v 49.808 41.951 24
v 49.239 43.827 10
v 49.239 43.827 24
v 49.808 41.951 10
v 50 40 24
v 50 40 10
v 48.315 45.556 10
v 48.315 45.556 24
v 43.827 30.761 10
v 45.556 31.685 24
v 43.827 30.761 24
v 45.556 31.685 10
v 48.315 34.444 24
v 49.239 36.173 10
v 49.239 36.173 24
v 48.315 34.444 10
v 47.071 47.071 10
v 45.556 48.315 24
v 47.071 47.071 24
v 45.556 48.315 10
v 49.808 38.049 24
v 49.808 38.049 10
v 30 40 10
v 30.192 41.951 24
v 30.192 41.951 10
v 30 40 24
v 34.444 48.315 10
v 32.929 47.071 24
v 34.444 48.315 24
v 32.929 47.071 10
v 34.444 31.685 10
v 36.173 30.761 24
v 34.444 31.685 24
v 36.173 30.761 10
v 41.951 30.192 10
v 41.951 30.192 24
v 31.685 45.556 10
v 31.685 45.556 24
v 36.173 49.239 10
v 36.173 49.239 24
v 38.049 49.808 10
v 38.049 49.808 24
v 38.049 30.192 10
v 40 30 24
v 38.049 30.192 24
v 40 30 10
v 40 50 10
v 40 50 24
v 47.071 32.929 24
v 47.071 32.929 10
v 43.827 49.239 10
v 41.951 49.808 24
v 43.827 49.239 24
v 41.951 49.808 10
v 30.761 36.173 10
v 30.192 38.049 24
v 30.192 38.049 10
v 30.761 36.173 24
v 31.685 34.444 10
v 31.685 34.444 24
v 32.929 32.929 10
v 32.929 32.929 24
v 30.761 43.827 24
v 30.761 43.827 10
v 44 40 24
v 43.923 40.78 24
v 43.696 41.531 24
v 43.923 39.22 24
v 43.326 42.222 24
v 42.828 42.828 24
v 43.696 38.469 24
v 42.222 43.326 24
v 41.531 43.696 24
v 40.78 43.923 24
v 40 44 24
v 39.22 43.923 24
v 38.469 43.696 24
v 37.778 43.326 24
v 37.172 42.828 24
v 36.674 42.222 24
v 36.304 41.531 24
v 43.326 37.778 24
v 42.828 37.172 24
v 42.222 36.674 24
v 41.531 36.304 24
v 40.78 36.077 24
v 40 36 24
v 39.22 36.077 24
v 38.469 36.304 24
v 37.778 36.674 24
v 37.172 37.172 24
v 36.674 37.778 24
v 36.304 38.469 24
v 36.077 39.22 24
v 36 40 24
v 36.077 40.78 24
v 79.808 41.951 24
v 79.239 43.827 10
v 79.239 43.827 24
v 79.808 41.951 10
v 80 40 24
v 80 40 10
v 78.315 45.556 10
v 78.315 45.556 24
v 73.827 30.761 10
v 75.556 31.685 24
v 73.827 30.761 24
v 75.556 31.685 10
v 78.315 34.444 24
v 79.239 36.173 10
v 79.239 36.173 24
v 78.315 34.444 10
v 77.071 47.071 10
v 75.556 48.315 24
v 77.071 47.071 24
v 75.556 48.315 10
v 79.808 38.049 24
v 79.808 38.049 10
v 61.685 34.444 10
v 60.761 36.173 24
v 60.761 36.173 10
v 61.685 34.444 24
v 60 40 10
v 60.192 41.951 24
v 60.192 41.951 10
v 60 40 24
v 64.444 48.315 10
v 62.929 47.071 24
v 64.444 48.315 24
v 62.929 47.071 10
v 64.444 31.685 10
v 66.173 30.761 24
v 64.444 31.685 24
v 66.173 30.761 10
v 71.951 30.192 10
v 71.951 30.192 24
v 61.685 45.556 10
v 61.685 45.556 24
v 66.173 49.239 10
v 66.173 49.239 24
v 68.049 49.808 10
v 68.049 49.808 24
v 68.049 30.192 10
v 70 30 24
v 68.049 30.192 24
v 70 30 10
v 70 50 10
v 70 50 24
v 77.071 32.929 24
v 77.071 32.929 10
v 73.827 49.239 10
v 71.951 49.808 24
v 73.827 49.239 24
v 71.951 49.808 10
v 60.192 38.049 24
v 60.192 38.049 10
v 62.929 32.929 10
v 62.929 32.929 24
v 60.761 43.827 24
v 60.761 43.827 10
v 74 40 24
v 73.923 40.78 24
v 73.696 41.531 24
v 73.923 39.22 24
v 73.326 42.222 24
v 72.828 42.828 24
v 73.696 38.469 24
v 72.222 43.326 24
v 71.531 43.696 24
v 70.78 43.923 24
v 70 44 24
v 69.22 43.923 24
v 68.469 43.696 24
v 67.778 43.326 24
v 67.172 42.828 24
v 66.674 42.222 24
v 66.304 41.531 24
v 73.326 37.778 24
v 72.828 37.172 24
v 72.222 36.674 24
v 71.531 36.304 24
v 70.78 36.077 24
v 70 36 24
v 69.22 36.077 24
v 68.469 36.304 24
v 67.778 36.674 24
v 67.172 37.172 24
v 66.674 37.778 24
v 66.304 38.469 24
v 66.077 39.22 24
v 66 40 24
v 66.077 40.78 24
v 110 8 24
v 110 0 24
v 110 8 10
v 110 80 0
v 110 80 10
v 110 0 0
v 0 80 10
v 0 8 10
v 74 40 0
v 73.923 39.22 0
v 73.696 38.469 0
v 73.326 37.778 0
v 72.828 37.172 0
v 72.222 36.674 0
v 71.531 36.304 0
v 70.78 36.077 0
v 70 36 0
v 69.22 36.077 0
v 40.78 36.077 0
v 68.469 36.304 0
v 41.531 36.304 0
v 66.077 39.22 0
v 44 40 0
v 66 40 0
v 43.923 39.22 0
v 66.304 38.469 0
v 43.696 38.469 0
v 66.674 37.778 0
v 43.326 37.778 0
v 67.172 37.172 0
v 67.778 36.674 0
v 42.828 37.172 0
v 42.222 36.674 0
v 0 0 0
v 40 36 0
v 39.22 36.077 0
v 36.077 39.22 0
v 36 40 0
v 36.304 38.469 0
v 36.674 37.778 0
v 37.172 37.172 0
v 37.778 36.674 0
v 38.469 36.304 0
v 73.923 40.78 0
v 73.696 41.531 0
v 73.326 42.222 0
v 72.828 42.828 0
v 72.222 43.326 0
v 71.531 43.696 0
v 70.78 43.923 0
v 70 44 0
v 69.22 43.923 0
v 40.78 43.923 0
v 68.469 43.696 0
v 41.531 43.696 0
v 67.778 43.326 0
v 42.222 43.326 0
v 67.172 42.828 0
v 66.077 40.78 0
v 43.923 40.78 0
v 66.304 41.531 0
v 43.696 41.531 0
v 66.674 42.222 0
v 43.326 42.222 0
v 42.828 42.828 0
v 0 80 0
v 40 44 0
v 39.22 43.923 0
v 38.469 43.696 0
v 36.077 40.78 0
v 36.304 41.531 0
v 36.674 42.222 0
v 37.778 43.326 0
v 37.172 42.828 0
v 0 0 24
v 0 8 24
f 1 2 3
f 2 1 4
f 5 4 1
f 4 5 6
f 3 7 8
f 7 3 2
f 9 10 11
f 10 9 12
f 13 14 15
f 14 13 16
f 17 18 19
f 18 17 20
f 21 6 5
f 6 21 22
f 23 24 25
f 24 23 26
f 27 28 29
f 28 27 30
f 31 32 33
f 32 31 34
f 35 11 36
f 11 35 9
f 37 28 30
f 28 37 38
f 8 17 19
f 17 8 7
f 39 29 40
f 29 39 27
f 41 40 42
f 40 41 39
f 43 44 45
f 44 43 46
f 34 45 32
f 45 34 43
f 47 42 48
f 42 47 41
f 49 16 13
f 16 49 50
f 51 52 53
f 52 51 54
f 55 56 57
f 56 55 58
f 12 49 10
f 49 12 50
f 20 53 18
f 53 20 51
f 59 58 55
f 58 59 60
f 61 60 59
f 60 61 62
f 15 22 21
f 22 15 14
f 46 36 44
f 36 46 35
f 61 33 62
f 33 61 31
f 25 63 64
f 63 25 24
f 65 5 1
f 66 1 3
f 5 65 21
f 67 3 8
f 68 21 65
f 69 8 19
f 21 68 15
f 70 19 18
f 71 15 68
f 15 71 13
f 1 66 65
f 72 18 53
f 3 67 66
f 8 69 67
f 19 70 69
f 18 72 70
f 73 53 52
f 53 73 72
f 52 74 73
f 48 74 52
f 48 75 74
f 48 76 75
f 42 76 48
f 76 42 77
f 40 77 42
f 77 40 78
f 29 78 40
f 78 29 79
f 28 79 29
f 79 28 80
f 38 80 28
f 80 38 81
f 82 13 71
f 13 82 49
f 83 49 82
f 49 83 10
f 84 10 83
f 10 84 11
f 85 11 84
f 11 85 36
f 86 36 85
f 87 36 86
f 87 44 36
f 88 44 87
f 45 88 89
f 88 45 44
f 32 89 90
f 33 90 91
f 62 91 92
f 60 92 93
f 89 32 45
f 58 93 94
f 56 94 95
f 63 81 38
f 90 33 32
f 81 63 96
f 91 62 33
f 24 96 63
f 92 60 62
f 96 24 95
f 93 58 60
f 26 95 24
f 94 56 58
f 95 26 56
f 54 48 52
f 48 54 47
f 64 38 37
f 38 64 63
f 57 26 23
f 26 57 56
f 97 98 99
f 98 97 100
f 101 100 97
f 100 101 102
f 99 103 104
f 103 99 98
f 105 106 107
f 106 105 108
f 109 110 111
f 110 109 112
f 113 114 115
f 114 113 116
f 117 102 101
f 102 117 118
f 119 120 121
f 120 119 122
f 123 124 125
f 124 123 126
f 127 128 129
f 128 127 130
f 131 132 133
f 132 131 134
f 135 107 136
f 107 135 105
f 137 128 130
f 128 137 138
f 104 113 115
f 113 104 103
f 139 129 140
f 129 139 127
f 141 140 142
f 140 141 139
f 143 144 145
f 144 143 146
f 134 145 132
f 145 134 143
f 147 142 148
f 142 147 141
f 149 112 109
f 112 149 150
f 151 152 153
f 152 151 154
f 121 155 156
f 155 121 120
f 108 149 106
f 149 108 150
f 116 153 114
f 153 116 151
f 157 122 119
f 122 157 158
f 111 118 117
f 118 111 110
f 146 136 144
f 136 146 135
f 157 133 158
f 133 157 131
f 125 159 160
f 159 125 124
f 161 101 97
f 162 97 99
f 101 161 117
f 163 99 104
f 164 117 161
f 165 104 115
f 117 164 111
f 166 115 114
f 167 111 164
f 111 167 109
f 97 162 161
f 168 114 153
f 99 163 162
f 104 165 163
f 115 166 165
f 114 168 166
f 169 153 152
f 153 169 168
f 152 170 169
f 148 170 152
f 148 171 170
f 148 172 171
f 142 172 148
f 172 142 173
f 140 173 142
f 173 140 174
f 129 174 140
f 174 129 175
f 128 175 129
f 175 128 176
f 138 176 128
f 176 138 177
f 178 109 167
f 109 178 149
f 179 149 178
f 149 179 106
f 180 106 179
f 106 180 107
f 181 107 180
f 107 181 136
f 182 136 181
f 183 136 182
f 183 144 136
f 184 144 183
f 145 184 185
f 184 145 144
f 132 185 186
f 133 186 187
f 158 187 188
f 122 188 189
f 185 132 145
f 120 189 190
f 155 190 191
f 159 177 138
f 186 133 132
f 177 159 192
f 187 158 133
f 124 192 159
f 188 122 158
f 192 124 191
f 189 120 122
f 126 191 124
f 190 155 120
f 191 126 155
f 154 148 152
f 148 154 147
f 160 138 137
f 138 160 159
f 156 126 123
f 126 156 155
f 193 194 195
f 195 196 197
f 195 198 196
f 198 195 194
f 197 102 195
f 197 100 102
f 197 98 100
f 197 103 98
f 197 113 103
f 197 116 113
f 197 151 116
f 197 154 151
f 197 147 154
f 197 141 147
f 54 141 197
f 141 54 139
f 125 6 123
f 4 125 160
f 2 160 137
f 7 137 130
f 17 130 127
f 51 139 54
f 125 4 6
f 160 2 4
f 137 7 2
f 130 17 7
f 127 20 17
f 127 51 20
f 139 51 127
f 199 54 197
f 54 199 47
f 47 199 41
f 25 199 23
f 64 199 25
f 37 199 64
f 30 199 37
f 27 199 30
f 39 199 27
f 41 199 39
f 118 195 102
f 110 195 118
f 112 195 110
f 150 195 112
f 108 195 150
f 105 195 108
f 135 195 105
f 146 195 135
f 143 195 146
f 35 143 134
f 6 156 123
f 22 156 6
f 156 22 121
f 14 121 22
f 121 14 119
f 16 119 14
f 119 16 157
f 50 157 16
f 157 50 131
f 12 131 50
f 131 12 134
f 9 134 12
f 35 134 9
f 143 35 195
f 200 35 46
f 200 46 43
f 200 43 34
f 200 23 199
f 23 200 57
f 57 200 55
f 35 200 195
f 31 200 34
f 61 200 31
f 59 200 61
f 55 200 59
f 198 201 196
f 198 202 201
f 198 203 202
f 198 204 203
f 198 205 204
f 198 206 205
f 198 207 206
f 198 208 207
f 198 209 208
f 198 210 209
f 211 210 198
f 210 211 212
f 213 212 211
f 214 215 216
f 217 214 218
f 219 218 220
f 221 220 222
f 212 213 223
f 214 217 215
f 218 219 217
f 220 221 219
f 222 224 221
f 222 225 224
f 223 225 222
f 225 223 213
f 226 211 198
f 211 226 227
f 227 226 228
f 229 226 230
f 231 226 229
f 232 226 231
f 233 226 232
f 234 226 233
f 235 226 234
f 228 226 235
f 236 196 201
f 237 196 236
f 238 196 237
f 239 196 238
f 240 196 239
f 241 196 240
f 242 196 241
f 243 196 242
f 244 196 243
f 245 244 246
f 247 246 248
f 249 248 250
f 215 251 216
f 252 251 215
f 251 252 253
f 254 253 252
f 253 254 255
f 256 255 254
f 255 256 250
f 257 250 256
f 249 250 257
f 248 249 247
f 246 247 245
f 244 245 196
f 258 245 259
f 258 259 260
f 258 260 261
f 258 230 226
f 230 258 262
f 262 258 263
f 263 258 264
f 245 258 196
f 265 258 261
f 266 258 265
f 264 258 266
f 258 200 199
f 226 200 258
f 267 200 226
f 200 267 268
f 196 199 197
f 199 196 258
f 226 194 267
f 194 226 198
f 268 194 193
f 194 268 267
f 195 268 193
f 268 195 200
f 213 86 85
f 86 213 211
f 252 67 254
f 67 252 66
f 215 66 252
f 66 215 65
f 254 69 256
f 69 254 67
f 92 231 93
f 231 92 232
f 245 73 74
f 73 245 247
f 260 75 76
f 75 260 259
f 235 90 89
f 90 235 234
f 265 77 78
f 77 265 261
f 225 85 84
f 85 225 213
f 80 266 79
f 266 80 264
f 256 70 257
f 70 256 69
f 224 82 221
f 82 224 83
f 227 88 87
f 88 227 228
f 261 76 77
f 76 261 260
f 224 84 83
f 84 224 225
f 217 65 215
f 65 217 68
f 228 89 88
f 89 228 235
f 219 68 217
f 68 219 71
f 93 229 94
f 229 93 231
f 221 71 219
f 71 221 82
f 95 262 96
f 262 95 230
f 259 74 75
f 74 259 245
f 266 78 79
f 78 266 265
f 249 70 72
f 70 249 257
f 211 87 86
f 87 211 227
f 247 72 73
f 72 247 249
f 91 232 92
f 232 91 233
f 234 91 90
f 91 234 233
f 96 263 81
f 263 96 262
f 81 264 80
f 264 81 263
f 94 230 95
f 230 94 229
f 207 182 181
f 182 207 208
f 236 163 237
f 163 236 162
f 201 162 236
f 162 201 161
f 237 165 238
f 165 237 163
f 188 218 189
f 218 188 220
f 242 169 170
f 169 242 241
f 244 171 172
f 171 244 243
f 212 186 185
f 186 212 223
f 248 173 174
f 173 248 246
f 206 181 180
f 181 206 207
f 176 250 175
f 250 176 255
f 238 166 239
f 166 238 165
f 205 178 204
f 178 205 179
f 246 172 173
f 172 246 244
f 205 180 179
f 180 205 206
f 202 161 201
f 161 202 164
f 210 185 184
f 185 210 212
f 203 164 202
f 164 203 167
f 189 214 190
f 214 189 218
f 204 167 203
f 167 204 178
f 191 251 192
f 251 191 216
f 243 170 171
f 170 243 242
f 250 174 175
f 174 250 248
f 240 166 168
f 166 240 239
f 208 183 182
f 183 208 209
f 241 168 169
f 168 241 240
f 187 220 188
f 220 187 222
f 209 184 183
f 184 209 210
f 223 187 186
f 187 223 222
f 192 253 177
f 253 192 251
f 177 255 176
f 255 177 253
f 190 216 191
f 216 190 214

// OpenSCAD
$fn = 32;

// ----------------------------------------------------------------------
// Drill jig: fence jig
// ----------------------------------------------------------------------

// --- parameters (mm) ---
plate_l = 110;            // plate length, X
plate_w = 80;             // plate width, Y
plate_t = 10;             // plate thickness
boss_d = 20;              // guide boss diameter
boss_h = 15;              // boss height above the plate
guide_d = 8;              // guide hole diameter
boss_pitch = 30;          // boss pitch
fence_h = 15;             // fence height above the plate
fence_t = 8;              // fence thickness
fit_tol = 0.1;            // tolerance for press fits, mm
free_tol = 0.5;           // tolerance for clearance fits, mm

n_boss = 2;  // guide bosses
boss_x0 = (plate_l - (n_boss - 1) * boss_pitch) / 2;  // first boss X
boss_top = plate_t - 1 + boss_h;  // boss crown height
fence_top = plate_t - 1 + fence_h;  // fence crown height
total_h = max([fence_top, boss_top]);  // overall height

difference() {
  union() {
  cube([plate_l, plate_w, plate_t]);
  for (i = [0 : n_boss - 1])
    translate([boss_x0 + i * boss_pitch, plate_w / 2, plate_t - 1])
      cylinder(h = boss_h, d = boss_d);
  translate([0, 0, plate_t - 1]) cube([plate_l, fence_t, fence_h]);
  }
  for (i = [0 : n_boss - 1])
    translate([boss_x0 + i * boss_pitch, plate_w / 2, -1])
      cylinder(h = plate_t + boss_h, d = guide_d);
}
